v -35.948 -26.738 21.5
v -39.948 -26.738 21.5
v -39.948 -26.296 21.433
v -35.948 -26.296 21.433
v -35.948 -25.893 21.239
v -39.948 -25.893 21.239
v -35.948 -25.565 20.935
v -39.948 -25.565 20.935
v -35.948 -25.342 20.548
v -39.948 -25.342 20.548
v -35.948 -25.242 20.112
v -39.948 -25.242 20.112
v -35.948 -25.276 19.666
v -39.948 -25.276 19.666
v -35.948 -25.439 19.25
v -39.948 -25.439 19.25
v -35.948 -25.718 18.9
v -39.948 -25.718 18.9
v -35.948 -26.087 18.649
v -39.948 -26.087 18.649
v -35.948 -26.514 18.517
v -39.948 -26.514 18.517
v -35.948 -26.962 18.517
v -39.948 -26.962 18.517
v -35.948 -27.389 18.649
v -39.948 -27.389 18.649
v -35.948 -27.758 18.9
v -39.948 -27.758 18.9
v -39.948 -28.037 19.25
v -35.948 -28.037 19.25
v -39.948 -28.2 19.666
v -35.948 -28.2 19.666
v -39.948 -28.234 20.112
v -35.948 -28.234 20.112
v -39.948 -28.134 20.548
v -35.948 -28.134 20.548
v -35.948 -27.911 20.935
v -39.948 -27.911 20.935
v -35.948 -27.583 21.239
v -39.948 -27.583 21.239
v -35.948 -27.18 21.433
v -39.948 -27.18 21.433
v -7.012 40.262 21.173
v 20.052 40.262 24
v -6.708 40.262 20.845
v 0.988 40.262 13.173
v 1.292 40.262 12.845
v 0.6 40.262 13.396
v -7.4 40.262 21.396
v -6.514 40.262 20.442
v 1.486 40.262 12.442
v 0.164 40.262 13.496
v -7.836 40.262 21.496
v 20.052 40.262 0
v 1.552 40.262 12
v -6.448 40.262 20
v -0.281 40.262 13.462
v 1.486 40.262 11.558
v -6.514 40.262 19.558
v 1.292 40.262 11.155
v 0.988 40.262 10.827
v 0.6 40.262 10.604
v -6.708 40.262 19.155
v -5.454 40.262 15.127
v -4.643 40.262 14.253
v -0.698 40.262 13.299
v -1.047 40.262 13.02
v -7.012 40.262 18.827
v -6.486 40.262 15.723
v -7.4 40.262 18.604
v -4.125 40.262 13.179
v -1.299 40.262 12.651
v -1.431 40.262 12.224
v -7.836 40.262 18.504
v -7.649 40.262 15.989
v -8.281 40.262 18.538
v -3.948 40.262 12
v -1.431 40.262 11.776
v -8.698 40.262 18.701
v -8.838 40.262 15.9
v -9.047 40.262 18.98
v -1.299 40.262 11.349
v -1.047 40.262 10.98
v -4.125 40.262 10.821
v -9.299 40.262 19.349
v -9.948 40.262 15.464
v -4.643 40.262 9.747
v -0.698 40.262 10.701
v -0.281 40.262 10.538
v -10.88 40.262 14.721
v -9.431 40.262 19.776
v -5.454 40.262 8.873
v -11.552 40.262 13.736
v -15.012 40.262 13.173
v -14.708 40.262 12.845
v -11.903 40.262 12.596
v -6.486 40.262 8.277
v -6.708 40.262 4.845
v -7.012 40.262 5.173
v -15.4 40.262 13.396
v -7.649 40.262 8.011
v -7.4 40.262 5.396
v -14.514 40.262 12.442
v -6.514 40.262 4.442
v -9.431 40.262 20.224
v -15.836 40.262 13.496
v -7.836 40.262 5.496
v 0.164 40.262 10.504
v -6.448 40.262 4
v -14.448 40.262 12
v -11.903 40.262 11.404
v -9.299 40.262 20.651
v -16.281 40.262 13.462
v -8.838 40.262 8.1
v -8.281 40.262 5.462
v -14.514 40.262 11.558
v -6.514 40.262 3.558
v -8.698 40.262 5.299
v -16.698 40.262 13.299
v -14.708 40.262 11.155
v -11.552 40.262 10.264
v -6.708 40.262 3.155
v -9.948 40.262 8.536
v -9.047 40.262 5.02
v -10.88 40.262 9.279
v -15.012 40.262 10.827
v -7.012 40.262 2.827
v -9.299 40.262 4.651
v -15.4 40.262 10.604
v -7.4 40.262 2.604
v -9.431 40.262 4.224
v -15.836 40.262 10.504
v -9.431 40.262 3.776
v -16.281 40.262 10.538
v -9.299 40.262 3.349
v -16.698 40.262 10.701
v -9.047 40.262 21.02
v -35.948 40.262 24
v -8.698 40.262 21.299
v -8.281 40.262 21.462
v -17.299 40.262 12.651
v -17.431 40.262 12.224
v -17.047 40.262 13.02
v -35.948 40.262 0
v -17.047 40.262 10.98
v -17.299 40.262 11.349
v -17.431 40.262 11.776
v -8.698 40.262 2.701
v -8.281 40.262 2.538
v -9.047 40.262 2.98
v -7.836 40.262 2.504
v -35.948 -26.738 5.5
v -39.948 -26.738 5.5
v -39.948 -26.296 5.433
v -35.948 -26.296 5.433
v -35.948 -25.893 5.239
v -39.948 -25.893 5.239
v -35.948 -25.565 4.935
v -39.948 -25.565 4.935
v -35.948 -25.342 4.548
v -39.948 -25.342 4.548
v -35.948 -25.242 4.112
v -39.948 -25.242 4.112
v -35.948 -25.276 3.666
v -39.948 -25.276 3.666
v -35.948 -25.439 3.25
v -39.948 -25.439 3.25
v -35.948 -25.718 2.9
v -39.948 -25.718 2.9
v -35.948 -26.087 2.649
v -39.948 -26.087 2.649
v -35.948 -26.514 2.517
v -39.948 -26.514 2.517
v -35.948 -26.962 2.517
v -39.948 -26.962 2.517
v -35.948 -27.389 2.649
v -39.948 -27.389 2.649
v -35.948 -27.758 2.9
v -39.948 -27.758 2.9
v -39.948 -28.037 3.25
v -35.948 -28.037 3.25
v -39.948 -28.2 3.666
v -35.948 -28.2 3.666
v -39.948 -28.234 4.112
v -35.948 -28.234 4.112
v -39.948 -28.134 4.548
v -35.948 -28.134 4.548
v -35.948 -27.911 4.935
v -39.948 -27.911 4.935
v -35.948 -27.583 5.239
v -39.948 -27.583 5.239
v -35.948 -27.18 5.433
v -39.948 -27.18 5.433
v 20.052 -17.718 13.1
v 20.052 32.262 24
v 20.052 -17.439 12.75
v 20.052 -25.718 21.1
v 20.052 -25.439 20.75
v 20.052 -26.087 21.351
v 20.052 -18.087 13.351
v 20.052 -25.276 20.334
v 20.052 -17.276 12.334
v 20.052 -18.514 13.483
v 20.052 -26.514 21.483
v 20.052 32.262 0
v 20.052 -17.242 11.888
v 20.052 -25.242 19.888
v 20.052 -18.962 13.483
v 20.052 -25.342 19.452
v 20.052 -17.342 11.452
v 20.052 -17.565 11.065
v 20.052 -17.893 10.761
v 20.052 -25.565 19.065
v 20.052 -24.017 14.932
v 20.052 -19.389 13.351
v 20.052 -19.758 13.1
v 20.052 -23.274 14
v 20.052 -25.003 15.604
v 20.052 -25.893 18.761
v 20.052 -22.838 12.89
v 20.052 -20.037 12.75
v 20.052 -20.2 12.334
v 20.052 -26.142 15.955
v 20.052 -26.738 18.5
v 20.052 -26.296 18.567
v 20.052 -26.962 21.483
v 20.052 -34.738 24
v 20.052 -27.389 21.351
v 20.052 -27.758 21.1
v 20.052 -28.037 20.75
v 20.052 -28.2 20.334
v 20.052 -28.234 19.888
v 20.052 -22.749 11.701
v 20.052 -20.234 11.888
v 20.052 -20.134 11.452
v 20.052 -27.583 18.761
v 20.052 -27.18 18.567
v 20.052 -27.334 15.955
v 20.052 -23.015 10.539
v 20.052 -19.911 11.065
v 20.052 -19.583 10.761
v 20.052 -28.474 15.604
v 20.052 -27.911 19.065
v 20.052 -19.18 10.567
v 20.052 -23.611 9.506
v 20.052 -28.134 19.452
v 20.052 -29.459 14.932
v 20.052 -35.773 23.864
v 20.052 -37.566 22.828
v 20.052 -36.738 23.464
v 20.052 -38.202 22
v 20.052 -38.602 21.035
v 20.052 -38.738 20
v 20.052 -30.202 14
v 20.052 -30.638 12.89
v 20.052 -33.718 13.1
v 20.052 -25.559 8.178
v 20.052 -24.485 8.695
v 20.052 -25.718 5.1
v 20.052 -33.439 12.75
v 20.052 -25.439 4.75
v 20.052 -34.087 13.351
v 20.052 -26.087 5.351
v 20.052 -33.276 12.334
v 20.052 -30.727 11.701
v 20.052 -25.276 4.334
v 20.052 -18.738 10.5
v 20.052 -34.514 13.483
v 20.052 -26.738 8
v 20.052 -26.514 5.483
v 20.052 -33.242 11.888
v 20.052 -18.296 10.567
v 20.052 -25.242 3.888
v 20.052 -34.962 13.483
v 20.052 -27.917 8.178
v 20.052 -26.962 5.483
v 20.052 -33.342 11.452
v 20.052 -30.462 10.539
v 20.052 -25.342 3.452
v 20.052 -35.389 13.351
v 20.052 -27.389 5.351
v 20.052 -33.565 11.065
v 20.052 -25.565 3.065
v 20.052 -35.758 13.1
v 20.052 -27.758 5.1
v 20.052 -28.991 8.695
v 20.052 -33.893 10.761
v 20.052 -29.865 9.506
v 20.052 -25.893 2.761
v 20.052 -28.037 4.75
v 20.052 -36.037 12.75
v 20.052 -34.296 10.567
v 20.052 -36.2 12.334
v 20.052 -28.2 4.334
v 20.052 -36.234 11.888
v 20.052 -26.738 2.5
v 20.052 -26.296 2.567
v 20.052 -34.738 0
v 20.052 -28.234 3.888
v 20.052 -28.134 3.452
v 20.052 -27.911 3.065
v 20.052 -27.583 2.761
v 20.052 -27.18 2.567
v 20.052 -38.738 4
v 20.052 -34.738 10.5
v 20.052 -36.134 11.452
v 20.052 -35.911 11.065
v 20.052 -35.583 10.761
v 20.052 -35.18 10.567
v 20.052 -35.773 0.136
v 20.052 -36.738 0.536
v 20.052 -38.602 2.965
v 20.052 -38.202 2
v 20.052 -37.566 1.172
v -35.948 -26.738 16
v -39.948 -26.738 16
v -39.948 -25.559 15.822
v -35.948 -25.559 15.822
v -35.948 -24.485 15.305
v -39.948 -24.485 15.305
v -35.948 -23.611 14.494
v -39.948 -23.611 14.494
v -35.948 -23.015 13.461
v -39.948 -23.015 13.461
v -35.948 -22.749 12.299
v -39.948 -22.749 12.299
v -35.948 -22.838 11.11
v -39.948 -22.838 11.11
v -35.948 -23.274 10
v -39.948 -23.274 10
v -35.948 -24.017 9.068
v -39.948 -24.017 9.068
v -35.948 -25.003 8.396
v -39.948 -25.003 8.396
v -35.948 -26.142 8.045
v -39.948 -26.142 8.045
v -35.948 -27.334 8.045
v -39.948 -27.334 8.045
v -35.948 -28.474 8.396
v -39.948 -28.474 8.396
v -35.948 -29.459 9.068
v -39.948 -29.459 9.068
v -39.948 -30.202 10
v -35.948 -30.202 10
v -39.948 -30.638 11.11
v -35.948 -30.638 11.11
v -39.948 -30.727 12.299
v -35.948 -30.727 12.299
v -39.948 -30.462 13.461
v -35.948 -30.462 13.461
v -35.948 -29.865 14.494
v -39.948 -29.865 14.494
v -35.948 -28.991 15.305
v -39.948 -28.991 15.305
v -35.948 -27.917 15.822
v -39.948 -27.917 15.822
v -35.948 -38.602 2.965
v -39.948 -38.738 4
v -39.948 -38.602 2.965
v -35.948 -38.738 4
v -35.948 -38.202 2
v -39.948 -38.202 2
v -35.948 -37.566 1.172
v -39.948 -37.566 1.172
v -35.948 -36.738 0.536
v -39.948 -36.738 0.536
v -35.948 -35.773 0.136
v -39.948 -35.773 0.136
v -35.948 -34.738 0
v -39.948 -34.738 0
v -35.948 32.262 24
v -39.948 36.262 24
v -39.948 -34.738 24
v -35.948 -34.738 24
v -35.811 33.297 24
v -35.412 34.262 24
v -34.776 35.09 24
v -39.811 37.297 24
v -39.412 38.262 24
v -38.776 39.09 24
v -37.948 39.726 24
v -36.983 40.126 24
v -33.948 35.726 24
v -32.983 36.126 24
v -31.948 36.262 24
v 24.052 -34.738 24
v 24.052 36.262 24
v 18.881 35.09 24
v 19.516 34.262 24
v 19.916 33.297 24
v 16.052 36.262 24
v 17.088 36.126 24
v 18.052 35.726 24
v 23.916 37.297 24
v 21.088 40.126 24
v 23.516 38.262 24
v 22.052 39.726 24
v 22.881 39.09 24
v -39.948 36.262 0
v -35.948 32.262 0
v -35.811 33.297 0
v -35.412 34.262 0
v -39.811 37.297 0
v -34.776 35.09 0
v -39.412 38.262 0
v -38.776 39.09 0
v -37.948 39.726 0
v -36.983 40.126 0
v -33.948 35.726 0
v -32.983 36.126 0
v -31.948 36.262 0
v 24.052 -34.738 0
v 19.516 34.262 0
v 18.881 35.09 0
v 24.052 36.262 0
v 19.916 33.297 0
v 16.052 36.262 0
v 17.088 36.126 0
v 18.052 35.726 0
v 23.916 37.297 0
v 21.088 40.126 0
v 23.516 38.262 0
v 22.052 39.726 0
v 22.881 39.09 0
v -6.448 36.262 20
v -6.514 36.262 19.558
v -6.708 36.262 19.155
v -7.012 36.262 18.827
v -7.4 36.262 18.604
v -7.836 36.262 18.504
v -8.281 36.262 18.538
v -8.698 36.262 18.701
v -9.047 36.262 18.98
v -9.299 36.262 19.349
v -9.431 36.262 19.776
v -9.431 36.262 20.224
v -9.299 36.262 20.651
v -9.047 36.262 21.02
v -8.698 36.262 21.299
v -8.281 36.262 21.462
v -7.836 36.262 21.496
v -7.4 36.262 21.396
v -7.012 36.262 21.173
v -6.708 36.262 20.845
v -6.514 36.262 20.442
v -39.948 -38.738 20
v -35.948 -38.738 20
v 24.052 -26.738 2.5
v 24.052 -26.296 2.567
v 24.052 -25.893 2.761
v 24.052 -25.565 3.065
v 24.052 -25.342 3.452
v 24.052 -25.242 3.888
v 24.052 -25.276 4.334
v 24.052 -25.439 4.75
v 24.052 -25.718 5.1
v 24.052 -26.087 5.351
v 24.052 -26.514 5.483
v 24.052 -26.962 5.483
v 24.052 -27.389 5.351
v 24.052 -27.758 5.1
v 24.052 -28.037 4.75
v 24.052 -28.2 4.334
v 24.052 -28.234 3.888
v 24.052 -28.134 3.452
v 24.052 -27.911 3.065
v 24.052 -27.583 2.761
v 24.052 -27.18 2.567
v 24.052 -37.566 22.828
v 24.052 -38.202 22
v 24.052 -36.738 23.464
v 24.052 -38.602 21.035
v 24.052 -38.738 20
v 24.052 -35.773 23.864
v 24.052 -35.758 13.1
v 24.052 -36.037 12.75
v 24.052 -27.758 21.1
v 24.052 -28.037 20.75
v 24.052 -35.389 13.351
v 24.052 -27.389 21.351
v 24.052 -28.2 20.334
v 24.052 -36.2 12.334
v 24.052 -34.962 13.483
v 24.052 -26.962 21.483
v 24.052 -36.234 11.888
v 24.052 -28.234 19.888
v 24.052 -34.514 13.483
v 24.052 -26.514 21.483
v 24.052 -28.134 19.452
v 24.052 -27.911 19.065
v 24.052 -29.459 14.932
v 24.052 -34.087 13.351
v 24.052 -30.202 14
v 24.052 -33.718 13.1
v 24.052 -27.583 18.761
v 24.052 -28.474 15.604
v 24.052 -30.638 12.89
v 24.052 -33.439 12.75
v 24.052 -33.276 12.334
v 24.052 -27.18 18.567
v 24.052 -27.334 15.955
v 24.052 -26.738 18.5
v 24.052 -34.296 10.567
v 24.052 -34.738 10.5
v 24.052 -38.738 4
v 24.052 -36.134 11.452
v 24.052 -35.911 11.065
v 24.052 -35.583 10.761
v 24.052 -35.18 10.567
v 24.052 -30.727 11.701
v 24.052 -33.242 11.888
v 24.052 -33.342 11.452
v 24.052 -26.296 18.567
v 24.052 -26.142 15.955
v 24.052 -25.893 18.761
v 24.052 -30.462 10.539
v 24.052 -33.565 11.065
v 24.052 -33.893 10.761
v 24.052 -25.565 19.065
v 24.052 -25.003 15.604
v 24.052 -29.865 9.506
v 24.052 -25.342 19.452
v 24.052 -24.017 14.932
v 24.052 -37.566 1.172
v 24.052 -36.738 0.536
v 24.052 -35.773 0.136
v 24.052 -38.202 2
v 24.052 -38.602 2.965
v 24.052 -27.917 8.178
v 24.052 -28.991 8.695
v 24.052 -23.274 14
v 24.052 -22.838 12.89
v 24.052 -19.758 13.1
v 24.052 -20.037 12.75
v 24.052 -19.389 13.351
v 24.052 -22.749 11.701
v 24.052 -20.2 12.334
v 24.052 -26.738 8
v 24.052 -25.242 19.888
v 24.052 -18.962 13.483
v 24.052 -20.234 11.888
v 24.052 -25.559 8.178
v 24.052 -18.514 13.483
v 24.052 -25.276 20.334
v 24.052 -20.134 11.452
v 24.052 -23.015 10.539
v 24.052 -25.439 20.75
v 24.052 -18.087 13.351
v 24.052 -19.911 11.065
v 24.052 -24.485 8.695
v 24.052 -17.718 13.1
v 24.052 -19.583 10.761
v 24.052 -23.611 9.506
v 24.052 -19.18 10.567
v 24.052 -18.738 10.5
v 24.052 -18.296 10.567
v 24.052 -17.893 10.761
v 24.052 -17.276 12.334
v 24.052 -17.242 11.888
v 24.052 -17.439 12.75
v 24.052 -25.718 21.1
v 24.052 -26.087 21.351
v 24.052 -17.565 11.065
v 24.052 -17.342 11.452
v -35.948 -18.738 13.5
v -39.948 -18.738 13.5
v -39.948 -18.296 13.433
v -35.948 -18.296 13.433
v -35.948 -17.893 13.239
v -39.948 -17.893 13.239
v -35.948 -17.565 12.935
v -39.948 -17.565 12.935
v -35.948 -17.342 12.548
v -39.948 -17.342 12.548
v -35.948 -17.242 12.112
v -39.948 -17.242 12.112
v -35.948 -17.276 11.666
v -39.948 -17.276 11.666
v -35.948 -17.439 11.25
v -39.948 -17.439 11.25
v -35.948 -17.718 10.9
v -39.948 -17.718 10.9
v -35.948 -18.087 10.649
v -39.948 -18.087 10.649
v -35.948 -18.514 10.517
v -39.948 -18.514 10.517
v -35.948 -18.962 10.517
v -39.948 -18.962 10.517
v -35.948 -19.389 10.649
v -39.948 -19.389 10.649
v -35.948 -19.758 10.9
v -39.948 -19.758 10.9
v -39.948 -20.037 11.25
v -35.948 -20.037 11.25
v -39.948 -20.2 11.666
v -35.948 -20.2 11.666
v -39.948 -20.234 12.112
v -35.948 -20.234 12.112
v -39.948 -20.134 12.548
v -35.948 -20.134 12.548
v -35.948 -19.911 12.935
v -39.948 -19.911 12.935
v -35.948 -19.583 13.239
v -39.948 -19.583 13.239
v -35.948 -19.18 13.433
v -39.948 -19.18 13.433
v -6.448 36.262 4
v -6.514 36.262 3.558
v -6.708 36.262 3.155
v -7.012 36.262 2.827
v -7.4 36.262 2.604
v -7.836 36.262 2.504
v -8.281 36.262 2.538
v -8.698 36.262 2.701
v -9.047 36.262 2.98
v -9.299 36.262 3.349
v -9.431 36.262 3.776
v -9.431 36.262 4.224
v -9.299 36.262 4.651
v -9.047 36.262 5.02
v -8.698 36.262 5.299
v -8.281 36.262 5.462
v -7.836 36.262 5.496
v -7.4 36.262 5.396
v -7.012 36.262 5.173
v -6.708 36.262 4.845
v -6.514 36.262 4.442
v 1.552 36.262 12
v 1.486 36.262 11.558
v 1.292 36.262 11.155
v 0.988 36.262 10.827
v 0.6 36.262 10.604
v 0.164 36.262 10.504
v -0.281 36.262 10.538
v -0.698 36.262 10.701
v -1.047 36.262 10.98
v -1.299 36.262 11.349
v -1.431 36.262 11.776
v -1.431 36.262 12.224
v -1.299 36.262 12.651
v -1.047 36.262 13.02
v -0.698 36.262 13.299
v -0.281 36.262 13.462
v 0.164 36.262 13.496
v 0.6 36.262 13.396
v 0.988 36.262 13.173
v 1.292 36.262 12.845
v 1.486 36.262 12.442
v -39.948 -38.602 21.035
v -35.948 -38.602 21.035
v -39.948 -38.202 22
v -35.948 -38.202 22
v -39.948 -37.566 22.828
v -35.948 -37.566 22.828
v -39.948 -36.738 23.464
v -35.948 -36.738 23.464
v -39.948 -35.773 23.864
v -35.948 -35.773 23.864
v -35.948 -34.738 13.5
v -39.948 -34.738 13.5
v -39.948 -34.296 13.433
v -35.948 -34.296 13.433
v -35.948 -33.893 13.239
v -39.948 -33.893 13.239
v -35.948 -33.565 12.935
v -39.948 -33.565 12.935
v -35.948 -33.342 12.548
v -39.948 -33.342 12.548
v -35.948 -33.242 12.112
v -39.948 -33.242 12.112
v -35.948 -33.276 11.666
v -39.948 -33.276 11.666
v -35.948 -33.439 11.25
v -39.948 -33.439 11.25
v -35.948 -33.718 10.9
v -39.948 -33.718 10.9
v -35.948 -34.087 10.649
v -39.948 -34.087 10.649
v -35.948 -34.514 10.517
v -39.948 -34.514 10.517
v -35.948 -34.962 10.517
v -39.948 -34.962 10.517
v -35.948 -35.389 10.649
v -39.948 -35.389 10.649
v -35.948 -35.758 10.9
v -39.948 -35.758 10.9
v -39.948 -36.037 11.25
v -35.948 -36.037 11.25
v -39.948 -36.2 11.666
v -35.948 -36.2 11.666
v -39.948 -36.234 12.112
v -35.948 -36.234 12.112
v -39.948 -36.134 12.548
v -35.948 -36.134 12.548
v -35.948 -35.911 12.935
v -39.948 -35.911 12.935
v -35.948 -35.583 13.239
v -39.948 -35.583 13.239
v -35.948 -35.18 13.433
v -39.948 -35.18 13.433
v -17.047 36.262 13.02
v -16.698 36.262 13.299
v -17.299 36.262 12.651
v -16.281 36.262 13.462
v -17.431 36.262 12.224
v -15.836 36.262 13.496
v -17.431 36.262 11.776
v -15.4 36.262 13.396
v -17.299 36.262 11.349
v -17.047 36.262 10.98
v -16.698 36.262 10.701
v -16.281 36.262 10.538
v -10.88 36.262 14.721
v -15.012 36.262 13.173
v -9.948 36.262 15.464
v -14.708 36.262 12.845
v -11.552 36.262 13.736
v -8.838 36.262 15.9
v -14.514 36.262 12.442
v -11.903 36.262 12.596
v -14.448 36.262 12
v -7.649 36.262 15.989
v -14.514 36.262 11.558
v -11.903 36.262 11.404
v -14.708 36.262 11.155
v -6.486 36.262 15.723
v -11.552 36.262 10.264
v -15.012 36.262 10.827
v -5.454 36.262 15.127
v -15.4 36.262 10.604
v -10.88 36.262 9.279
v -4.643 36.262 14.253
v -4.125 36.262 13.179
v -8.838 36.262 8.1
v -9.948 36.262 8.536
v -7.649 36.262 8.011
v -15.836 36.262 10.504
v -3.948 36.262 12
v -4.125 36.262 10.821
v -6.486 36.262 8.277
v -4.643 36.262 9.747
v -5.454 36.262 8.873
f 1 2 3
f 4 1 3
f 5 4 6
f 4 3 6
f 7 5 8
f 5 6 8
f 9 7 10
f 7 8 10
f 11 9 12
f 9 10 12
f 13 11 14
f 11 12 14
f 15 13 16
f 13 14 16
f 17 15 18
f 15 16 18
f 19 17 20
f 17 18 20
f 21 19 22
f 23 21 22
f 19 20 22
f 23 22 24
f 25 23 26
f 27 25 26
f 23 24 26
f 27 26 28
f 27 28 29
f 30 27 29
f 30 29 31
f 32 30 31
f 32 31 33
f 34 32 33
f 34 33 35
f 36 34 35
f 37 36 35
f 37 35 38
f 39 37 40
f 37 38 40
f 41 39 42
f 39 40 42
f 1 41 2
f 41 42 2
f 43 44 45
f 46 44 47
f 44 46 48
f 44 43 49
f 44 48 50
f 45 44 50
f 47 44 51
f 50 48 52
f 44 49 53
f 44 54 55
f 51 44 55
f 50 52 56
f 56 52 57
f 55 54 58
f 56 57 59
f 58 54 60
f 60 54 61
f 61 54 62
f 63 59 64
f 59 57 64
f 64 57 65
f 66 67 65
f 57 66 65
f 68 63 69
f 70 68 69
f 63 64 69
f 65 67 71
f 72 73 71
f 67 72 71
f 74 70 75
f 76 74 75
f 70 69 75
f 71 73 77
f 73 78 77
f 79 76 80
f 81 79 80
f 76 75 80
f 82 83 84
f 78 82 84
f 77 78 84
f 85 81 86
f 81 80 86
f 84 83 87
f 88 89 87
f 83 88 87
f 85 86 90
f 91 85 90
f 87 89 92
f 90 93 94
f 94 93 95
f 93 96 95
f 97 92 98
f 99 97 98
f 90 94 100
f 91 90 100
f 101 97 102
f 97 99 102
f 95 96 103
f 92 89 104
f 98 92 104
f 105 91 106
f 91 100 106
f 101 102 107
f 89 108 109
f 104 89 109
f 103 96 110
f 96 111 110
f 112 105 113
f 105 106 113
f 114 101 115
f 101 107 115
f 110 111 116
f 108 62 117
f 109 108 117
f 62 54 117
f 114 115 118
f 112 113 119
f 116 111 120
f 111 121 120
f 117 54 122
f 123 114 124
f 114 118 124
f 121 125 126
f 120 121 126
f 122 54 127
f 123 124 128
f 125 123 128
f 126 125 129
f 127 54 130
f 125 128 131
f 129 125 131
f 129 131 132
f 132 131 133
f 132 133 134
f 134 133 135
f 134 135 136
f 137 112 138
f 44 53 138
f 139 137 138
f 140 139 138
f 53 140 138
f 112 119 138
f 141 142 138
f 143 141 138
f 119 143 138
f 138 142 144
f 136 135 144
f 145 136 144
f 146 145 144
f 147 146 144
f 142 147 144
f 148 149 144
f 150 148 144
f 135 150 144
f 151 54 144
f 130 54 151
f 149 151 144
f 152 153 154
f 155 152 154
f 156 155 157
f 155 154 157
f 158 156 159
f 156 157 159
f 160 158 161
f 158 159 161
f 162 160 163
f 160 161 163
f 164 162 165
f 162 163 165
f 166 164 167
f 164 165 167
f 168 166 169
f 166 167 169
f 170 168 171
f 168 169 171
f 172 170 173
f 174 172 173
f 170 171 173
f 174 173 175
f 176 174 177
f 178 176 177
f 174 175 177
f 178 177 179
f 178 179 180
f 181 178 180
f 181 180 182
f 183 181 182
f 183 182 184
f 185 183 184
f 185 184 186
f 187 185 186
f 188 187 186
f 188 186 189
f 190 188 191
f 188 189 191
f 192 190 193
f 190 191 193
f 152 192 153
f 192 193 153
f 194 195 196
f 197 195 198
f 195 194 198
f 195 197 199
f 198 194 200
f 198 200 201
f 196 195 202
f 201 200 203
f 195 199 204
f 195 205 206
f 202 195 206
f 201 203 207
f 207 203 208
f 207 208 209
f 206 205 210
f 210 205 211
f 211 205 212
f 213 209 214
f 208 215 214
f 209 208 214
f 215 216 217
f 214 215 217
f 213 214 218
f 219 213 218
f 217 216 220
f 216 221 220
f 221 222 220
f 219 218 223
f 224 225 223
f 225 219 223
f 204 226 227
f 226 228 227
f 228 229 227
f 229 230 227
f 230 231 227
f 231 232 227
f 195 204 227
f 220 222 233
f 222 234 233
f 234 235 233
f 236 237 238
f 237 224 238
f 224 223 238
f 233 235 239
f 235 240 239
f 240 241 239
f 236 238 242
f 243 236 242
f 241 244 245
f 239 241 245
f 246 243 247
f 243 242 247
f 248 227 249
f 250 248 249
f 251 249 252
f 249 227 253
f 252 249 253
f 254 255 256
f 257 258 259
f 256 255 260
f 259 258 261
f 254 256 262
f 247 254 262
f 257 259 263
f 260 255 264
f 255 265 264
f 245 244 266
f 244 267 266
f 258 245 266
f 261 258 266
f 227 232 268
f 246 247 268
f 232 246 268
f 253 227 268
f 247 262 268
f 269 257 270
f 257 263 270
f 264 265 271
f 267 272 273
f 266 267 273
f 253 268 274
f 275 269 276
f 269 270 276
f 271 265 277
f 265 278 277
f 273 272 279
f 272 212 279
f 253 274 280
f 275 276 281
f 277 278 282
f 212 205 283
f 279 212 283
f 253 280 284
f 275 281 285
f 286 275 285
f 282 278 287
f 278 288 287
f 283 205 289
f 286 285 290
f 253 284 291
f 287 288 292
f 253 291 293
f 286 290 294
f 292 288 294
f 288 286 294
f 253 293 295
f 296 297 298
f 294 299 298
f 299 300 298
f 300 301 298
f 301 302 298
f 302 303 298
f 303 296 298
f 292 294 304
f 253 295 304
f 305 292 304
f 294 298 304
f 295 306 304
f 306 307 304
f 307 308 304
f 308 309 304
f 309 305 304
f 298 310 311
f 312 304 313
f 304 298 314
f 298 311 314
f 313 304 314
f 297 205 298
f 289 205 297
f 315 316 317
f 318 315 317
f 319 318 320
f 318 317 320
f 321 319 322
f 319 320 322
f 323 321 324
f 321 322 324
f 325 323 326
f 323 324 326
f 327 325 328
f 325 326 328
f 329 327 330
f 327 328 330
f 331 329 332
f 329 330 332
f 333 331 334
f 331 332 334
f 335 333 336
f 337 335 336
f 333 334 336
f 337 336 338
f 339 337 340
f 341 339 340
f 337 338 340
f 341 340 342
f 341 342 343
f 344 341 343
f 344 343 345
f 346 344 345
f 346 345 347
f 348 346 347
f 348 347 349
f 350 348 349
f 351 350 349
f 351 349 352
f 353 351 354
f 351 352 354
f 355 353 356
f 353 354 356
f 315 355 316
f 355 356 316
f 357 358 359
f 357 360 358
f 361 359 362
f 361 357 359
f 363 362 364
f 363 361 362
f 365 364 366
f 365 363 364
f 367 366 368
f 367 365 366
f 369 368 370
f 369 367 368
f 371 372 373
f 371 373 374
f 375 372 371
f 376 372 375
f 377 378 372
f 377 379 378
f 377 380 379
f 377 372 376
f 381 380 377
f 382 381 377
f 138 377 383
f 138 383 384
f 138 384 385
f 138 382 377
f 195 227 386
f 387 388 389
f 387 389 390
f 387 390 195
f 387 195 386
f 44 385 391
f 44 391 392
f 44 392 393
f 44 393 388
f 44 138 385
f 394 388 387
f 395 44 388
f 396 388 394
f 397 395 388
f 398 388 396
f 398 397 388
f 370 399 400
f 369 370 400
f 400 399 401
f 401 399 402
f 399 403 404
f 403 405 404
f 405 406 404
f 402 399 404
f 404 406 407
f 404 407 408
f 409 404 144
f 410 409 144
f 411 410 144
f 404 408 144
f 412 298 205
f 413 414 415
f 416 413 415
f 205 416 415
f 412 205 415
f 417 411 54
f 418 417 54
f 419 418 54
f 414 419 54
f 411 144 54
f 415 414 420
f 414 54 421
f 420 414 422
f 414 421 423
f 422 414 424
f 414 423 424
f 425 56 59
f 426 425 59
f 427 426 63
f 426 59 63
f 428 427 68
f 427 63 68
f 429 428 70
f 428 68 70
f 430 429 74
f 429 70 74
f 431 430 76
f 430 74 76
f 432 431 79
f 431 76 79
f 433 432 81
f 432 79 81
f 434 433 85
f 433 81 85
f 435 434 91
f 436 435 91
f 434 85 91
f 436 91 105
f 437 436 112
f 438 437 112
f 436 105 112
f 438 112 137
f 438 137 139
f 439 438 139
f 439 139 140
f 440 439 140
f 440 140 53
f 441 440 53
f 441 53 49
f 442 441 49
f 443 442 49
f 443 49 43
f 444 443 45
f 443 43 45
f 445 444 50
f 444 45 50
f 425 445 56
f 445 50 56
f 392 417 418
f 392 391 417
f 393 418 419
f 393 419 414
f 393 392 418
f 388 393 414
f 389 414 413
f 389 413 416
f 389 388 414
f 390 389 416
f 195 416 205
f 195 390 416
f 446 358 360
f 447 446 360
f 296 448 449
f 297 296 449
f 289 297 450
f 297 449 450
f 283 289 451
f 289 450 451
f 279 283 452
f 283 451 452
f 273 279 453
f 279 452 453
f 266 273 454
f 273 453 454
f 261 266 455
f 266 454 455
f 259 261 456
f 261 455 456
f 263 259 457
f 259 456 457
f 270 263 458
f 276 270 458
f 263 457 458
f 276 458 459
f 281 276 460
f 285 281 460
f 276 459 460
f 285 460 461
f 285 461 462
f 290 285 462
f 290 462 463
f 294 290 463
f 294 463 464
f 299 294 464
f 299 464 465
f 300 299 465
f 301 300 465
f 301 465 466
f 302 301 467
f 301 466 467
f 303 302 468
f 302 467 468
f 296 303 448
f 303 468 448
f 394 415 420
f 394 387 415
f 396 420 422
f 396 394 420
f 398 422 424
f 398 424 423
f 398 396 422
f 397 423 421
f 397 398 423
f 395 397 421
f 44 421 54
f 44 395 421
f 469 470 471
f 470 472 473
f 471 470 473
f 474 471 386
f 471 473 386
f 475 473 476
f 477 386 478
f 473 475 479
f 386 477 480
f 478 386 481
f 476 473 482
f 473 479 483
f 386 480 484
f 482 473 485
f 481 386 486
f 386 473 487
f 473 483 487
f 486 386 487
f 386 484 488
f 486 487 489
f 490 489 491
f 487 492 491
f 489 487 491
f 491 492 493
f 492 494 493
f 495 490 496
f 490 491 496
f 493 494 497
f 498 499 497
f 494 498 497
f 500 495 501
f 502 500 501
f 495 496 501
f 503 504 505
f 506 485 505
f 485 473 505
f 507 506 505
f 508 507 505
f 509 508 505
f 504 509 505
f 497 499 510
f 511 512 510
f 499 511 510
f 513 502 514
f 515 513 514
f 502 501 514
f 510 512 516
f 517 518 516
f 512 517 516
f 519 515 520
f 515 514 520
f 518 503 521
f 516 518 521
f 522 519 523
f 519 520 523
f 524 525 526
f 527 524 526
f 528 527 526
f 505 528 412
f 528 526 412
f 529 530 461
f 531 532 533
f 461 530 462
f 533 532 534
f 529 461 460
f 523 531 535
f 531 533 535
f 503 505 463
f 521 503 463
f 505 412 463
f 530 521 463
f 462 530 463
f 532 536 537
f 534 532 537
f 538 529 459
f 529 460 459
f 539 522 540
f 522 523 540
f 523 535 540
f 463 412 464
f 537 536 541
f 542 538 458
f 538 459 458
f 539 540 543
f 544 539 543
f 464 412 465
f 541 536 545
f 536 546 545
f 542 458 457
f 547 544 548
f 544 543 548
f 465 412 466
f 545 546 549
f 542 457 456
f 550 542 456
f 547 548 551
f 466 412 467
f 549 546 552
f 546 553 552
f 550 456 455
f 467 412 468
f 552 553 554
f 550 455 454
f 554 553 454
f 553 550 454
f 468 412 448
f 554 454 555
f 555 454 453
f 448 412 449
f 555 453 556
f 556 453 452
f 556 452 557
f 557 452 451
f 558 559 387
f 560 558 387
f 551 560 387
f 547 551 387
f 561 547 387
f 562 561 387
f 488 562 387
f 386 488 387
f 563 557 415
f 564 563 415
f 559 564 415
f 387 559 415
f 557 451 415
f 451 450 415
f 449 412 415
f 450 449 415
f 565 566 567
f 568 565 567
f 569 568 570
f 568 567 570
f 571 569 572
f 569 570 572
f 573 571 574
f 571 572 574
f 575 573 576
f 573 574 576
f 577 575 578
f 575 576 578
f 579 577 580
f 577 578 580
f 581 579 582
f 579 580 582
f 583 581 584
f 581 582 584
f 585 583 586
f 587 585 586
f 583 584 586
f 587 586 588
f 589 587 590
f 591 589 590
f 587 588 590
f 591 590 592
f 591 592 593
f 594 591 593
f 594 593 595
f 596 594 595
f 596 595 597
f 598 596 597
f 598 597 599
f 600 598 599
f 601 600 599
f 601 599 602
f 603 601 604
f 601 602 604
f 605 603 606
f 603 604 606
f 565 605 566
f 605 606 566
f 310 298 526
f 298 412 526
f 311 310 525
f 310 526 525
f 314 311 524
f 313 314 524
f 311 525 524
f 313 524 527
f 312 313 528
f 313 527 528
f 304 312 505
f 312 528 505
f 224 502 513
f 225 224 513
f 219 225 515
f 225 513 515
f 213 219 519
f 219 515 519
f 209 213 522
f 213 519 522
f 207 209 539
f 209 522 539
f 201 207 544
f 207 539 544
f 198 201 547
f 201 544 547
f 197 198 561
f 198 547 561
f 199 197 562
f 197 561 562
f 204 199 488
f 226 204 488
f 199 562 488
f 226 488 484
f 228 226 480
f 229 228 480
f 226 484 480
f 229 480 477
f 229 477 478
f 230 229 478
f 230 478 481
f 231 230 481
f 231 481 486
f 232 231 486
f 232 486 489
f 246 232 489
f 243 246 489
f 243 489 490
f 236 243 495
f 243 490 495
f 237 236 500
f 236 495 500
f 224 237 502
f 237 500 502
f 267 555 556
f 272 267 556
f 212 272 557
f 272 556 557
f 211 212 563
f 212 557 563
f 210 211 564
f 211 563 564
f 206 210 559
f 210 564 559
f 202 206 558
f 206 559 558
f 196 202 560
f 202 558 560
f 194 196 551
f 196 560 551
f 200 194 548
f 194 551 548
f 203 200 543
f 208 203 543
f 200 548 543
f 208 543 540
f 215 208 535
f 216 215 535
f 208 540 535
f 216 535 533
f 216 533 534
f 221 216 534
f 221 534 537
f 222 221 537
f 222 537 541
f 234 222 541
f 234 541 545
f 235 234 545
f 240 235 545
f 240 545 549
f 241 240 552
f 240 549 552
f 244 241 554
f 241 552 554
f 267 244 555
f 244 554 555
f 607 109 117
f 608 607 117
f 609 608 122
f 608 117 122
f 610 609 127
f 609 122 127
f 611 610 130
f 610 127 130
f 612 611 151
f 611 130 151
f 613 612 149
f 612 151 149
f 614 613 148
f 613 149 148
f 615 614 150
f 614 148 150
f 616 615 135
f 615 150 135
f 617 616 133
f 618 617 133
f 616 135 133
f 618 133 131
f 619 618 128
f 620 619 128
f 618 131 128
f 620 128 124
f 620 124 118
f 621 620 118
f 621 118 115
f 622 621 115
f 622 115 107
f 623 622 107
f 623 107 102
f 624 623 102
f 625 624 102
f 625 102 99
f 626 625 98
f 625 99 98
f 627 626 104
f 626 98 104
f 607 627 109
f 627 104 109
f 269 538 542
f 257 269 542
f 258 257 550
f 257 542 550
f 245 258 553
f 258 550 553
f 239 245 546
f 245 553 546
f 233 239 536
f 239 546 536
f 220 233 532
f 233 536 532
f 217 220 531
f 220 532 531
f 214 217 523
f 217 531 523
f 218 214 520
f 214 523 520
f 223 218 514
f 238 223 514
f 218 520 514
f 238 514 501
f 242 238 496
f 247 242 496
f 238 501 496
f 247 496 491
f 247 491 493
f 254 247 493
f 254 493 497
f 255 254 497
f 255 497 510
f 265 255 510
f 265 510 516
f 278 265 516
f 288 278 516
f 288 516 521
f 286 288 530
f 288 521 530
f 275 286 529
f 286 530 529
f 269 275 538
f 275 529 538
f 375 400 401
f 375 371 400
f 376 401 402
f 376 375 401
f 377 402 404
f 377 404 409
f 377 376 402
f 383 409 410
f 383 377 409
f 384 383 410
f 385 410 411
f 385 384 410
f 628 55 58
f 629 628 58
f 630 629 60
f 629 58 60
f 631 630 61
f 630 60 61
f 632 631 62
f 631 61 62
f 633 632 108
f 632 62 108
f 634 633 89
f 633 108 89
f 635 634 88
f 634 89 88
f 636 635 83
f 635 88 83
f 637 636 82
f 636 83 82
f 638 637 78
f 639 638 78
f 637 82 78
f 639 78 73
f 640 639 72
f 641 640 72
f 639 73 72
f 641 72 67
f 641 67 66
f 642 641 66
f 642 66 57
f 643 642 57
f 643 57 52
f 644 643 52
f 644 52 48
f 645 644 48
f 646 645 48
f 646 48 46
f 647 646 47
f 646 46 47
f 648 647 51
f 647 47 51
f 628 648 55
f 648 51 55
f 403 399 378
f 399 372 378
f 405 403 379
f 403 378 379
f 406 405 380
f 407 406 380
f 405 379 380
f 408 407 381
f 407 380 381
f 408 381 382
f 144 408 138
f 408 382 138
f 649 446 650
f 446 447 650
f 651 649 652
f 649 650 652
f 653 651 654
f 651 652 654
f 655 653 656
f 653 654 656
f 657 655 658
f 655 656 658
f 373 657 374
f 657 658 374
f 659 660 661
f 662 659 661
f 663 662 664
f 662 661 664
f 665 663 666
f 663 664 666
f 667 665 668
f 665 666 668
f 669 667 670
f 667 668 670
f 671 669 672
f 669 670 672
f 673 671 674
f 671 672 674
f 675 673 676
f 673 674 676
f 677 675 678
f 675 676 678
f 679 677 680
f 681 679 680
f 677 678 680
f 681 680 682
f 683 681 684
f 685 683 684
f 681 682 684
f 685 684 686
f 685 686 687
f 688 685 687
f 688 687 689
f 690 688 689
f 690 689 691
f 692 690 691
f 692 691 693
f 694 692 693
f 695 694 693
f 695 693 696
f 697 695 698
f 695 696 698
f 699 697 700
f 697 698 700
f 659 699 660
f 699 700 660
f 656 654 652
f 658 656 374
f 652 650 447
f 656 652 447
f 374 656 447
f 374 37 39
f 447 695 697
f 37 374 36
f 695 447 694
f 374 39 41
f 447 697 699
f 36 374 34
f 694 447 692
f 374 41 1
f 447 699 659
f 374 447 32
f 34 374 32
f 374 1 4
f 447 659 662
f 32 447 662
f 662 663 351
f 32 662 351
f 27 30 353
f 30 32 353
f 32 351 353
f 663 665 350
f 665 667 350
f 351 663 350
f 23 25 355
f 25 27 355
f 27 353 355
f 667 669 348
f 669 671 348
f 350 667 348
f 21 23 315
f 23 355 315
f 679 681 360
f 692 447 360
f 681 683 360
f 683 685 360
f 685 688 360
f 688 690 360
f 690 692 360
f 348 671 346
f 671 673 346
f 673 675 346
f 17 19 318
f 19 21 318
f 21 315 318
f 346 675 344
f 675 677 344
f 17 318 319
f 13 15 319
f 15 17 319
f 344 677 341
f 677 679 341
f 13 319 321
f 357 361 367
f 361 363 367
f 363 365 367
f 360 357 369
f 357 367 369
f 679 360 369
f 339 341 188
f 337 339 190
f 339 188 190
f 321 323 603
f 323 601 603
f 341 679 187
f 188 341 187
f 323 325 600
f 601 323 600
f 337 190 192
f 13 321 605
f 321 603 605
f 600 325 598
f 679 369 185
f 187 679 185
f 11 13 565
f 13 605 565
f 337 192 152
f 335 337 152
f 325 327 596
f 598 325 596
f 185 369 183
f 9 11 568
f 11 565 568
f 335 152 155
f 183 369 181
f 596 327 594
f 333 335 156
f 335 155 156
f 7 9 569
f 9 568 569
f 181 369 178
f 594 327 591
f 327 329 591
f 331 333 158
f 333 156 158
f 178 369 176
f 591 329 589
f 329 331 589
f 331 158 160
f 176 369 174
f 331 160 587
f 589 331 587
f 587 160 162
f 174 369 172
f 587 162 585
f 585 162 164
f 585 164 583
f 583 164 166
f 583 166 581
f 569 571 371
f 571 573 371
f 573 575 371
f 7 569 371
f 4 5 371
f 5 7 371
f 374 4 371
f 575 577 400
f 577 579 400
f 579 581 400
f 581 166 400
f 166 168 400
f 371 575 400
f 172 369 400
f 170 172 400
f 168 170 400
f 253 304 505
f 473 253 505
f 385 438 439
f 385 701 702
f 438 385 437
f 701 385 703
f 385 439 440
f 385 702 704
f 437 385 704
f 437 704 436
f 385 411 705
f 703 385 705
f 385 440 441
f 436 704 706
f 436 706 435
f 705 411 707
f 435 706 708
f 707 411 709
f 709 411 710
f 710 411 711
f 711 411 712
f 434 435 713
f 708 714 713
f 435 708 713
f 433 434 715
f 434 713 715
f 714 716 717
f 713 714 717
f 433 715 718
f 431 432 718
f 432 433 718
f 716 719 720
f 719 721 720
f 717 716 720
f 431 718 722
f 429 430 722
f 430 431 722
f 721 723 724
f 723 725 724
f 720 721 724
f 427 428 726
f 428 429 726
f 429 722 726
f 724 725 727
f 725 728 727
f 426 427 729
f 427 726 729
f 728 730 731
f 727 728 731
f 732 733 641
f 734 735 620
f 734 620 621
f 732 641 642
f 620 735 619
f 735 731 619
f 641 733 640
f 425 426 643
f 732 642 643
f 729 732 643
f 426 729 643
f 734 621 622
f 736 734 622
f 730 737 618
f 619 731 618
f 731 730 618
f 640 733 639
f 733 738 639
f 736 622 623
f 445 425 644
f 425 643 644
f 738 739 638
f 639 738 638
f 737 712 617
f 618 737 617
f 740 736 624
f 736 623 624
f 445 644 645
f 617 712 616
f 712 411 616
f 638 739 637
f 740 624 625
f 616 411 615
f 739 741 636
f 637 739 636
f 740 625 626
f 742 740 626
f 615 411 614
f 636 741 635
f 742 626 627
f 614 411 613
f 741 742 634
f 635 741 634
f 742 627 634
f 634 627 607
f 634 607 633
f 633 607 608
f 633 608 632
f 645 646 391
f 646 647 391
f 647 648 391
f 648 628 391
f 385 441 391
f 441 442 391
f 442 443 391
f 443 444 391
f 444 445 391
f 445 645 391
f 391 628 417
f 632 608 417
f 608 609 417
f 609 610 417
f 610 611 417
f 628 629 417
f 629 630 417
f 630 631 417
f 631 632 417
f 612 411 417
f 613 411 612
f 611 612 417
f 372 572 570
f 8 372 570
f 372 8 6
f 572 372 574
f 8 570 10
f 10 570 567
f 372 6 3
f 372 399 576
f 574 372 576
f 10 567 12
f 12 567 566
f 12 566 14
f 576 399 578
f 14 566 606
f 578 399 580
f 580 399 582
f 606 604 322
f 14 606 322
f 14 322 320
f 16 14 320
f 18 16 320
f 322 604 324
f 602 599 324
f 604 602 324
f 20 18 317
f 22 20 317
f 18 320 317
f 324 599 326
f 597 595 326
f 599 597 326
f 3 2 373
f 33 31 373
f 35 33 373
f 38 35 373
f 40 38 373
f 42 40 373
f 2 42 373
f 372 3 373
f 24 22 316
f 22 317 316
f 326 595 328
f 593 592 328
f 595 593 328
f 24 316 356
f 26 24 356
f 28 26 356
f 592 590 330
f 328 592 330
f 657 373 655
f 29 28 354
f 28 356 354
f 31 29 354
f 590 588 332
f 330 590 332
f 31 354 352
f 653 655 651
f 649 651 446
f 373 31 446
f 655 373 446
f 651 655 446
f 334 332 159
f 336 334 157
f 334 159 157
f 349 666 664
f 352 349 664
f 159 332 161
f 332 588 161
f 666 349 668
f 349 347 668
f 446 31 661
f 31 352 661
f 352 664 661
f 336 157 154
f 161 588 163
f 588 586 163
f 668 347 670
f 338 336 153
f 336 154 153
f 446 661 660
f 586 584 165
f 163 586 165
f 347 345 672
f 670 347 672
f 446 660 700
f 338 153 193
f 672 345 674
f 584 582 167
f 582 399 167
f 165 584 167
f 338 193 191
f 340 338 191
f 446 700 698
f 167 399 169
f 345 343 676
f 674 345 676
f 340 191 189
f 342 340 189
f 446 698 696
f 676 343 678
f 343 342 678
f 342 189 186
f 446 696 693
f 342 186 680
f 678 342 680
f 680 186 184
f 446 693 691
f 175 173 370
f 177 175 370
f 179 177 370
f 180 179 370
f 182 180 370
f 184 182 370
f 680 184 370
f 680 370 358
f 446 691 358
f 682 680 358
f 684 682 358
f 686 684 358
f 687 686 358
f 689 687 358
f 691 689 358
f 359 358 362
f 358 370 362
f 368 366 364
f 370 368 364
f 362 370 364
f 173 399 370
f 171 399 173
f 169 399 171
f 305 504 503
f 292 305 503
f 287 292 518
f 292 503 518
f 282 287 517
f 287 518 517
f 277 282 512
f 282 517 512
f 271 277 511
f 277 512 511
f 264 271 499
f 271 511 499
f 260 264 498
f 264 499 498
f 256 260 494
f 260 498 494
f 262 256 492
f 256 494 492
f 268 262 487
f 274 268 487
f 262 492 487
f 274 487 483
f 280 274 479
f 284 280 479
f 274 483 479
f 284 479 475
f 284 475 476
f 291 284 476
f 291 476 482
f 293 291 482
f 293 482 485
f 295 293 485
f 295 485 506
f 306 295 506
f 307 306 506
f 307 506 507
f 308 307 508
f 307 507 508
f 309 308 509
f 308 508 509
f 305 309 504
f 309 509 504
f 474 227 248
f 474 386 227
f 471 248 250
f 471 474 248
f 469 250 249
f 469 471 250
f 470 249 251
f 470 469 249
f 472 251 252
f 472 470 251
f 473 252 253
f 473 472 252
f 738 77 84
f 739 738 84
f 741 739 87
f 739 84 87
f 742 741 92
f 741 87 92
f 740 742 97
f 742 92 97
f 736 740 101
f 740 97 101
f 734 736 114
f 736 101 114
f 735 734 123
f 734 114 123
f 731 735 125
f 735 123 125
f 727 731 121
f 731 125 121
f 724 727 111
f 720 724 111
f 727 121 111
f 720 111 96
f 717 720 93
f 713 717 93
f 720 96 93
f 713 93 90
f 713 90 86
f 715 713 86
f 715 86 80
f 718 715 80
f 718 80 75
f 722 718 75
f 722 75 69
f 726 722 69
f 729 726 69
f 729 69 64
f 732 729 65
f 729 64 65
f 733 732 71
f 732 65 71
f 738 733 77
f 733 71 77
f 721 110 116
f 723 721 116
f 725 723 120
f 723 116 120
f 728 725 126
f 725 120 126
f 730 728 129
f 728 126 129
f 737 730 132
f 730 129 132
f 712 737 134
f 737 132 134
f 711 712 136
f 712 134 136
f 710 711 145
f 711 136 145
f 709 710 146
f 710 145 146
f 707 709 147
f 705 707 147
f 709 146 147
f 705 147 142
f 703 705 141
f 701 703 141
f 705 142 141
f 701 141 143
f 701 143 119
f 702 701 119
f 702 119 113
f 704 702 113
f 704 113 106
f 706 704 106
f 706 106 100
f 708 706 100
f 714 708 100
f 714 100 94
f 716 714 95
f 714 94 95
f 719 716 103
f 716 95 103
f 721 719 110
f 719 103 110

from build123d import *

# Parameters (mm, degrees)
BOSS_EXTRUDE1_DEPTH = 24
SKETCH2_R           = 4
SKETCH2_R_2         = 1.5
CUT_EXTRUDE1_DEPTH  = 4
SKETCH3_R           = 4
SKETCH3_R_2         = 1.5
CUT_EXTRUDE2_DEPTH  = 4
FILLET1_R           = 4
SKETCH6_R           = 4
SKETCH6_R_2         = 1.5
CUT_EXTRUDE3_DEPTH  = 4


with BuildPart() as part:
    # Sketch1 → Boss-Extrude1 (new body)
    with BuildSketch(Plane.XY):
        Polygon((-35.947712149, -38.738038278), (-35.947712149, 36.261961722), (20.052287851, 36.261961722), (20.052287851, -38.738038278), (24.052287851, -38.738038278), (24.052287851, 40.261961722), (-39.947712149, 40.261961722), (-39.947712149, -38.738038278), align=None)
    extrude(amount=BOSS_EXTRUDE1_DEPTH)

    # Sketch2 → Cut-Extrude1 (cut)
    with BuildSketch(Plane(origin=(24.052287851, 0, 0), x_dir=(0, 0, -1), z_dir=(1, 0, 0))):
        with Locations((-12, -26.738038278)):
            Circle(SKETCH2_R)
        with Locations((-4, -26.738038278)):
            Circle(SKETCH2_R_2)
        with Locations((-12, -34.738038278)):
            Circle(SKETCH2_R_2)
        with Locations((-20, -26.738038278)):
            Circle(SKETCH2_R_2)
        with Locations((-12, -18.738038278)):
            Circle(SKETCH2_R_2)
    extrude(amount=-CUT_EXTRUDE1_DEPTH, mode=Mode.SUBTRACT)

    # Sketch3 → Cut-Extrude2 (cut)
    with BuildSketch(Plane.ZY.offset(39.947712149)):
        with Locations((12, -26.738038278)):
            Circle(SKETCH3_R)
        with Locations((20, -26.738038278)):
            Circle(SKETCH3_R_2)
        with Locations((12, -34.738038278)):
            Circle(SKETCH3_R_2)
        with Locations((4, -26.738038278)):
            Circle(SKETCH3_R_2)
        with Locations((12, -18.738038278)):
            Circle(SKETCH3_R_2)
    extrude(amount=-CUT_EXTRUDE2_DEPTH, mode=Mode.SUBTRACT)

    # Fillet1
    fillet1_edges = [part.edges().sort_by_distance(p)[0] for p in [
        (22.052287851, -38.738038278, 0),
        (20.052287851, 36.261961722, 12),
        (-35.947712149, 36.261961722, 12),
        (-39.947712149, 40.261961722, 12),
        (24.052287851, 40.261961722, 12),
        (-37.947712149, -38.738038278, 24),
        (22.052287851, -38.738038278, 24),
        (-37.947712149, -38.738038278, 0),
    ]]
    fillet(fillet1_edges, radius=FILLET1_R)

    # Sketch6 → Cut-Extrude3 (cut)
    with BuildSketch(Plane(origin=(0, 40.261961722, 0), x_dir=(1, 0, 0), z_dir=(0, 1, 0))):
        with Locations((-7.947712149, -12)):
            Circle(SKETCH6_R)
        with Locations((0.052287851, -12)):
            Circle(SKETCH6_R_2)
        with Locations((-7.947712149, -20)):
            Circle(SKETCH6_R_2)
        with Locations((-15.947712149, -12)):
            Circle(SKETCH6_R_2)
        with Locations((-7.947712149, -4)):
            Circle(SKETCH6_R_2)
    extrude(amount=-CUT_EXTRUDE3_DEPTH, mode=Mode.SUBTRACT)


solid = part.part
